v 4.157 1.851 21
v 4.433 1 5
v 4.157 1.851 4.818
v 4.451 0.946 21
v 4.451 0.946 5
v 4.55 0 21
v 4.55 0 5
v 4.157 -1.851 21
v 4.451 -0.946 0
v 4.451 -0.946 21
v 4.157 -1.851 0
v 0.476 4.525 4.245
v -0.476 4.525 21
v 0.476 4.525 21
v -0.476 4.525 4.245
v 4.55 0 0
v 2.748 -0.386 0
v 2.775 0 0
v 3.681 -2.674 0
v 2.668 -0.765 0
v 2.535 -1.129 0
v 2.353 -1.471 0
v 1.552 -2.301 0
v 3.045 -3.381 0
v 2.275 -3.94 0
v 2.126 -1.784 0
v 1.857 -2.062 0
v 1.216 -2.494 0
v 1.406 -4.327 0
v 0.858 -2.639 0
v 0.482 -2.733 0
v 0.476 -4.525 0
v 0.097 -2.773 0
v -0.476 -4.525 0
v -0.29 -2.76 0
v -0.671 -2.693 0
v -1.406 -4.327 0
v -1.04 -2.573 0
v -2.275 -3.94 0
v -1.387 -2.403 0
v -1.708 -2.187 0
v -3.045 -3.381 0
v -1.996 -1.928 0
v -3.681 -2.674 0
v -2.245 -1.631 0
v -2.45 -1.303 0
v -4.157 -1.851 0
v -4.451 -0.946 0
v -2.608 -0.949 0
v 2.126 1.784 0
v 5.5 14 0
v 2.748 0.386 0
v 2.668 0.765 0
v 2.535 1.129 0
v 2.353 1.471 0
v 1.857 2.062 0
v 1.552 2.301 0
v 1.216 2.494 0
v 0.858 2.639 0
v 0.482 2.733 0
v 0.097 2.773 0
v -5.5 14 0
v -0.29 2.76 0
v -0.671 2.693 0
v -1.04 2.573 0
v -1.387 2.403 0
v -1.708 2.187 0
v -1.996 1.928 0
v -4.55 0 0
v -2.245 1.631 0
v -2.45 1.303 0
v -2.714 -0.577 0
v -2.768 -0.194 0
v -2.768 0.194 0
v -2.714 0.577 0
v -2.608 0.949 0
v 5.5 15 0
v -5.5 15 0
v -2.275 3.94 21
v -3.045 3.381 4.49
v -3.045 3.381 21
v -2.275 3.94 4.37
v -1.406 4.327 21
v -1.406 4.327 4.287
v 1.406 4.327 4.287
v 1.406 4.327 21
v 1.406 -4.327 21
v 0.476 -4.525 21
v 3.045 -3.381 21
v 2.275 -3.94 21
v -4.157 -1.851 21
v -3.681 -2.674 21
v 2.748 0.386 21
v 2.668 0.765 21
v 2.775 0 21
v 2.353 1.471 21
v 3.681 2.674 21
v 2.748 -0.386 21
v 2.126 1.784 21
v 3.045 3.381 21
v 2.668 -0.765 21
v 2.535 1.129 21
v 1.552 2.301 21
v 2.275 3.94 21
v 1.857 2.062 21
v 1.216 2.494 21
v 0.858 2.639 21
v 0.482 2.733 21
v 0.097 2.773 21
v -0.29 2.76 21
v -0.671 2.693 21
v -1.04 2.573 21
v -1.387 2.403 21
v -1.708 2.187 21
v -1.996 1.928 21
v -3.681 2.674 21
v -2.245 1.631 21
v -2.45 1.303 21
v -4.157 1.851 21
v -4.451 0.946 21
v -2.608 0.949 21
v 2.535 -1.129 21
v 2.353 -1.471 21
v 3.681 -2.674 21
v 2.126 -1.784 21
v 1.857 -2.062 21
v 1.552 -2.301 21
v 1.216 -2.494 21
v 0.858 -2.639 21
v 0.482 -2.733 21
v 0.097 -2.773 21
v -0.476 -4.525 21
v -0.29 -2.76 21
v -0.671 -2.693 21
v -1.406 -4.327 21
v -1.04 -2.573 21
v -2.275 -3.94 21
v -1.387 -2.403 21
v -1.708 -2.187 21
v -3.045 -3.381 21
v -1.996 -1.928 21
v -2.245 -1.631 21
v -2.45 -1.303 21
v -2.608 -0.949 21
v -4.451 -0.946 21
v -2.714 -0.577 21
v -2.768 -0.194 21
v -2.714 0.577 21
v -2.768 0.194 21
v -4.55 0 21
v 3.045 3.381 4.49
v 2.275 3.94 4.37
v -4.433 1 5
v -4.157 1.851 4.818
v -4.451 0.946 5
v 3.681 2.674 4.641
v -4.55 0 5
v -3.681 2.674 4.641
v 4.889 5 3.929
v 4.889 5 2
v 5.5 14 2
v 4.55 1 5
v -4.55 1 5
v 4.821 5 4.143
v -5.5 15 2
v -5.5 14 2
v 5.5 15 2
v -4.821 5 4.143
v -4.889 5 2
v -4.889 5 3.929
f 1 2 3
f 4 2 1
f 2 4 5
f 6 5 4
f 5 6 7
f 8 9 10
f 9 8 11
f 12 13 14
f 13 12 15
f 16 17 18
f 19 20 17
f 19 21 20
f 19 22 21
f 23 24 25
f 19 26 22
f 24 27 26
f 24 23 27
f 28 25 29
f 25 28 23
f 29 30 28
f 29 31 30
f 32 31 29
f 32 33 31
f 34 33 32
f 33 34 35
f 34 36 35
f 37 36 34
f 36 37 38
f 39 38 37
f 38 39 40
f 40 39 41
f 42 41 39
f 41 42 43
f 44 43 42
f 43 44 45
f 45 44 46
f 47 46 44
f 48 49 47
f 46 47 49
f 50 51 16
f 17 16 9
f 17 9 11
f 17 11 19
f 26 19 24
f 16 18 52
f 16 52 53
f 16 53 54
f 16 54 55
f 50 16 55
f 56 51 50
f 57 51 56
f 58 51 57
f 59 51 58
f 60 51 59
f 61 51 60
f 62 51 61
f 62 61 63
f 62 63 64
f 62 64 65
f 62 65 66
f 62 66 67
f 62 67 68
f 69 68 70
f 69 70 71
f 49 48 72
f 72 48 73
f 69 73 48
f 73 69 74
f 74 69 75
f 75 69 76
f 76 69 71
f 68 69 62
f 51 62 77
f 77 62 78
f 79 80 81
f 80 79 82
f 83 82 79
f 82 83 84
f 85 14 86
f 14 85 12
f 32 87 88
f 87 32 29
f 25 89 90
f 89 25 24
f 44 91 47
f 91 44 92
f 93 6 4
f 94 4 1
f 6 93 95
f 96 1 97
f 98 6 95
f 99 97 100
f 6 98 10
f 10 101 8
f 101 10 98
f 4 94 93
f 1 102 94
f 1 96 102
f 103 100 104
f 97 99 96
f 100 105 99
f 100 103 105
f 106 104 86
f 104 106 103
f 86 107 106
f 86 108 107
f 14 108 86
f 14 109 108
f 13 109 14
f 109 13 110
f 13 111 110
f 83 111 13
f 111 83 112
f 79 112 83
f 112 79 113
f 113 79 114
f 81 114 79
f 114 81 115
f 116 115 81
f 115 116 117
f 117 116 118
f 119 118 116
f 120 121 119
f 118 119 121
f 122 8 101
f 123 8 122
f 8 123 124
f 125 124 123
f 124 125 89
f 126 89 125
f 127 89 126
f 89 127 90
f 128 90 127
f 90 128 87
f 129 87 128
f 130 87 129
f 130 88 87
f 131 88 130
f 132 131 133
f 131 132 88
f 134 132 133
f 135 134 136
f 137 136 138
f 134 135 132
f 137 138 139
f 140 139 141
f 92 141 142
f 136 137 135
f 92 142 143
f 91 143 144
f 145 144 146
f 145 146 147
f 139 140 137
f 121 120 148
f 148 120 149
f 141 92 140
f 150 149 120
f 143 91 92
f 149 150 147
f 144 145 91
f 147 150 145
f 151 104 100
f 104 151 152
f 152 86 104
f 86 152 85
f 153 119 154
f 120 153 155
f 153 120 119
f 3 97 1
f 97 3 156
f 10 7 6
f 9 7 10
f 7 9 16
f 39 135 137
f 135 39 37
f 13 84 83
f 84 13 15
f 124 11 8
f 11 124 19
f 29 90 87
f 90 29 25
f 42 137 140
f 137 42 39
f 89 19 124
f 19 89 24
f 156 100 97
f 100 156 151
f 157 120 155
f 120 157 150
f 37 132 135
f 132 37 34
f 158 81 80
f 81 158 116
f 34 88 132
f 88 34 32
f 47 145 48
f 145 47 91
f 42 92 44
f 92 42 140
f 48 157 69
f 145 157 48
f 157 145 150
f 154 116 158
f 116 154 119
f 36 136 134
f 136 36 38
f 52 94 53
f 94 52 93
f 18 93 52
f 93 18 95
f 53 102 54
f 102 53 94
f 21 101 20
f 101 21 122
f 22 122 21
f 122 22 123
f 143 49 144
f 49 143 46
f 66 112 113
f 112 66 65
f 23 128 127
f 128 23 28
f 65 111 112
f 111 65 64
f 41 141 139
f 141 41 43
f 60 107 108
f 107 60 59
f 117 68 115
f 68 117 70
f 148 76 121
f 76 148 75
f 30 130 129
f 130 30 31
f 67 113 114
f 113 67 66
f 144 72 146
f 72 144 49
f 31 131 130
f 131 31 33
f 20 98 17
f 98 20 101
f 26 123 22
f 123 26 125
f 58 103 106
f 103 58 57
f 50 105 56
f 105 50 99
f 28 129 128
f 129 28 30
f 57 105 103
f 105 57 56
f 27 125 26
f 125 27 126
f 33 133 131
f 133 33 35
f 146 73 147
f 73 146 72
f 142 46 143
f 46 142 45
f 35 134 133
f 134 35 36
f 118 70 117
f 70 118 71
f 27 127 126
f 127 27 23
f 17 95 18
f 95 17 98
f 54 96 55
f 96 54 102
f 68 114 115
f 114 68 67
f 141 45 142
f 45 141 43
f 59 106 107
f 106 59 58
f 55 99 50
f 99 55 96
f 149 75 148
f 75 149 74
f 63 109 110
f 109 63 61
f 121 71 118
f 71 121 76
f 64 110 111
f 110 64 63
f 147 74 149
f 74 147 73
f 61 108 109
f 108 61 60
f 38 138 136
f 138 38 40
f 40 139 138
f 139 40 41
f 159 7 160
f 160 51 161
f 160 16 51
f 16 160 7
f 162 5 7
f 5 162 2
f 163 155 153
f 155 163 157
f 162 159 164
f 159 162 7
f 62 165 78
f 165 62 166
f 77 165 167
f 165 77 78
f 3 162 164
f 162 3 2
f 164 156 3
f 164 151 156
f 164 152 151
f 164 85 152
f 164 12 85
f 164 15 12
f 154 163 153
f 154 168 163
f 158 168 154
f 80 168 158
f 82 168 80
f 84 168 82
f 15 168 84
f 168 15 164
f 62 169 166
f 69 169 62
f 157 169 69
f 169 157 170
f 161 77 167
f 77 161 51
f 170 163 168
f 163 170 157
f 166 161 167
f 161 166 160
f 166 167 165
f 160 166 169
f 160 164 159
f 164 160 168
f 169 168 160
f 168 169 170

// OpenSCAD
holderHeight = 21;


module antennaPart() {
    difference() {
        hull() {
            translate([-4.55, 0, 0]) cube([9.1, 1, 5]);
            translate([-5.5, 14, 0]) cube([11, 1, 2]);
        }
        translate([-5.5, 5, 2]) cube([11, 10, 3]);
    }
}

module cylinderPart() {
    difference() {
        cylinder(h = holderHeight, d = 9.1, $fn=30);
        cylinder(h = holderHeight, d = 5.55, $fn=45); // hole
    }
}

module main() {
    cylinderPart();
    difference() {
        antennaPart();
        cylinder(h = holderHeight, d = 5.55, $fn=45); // hole
    }

}

main();
